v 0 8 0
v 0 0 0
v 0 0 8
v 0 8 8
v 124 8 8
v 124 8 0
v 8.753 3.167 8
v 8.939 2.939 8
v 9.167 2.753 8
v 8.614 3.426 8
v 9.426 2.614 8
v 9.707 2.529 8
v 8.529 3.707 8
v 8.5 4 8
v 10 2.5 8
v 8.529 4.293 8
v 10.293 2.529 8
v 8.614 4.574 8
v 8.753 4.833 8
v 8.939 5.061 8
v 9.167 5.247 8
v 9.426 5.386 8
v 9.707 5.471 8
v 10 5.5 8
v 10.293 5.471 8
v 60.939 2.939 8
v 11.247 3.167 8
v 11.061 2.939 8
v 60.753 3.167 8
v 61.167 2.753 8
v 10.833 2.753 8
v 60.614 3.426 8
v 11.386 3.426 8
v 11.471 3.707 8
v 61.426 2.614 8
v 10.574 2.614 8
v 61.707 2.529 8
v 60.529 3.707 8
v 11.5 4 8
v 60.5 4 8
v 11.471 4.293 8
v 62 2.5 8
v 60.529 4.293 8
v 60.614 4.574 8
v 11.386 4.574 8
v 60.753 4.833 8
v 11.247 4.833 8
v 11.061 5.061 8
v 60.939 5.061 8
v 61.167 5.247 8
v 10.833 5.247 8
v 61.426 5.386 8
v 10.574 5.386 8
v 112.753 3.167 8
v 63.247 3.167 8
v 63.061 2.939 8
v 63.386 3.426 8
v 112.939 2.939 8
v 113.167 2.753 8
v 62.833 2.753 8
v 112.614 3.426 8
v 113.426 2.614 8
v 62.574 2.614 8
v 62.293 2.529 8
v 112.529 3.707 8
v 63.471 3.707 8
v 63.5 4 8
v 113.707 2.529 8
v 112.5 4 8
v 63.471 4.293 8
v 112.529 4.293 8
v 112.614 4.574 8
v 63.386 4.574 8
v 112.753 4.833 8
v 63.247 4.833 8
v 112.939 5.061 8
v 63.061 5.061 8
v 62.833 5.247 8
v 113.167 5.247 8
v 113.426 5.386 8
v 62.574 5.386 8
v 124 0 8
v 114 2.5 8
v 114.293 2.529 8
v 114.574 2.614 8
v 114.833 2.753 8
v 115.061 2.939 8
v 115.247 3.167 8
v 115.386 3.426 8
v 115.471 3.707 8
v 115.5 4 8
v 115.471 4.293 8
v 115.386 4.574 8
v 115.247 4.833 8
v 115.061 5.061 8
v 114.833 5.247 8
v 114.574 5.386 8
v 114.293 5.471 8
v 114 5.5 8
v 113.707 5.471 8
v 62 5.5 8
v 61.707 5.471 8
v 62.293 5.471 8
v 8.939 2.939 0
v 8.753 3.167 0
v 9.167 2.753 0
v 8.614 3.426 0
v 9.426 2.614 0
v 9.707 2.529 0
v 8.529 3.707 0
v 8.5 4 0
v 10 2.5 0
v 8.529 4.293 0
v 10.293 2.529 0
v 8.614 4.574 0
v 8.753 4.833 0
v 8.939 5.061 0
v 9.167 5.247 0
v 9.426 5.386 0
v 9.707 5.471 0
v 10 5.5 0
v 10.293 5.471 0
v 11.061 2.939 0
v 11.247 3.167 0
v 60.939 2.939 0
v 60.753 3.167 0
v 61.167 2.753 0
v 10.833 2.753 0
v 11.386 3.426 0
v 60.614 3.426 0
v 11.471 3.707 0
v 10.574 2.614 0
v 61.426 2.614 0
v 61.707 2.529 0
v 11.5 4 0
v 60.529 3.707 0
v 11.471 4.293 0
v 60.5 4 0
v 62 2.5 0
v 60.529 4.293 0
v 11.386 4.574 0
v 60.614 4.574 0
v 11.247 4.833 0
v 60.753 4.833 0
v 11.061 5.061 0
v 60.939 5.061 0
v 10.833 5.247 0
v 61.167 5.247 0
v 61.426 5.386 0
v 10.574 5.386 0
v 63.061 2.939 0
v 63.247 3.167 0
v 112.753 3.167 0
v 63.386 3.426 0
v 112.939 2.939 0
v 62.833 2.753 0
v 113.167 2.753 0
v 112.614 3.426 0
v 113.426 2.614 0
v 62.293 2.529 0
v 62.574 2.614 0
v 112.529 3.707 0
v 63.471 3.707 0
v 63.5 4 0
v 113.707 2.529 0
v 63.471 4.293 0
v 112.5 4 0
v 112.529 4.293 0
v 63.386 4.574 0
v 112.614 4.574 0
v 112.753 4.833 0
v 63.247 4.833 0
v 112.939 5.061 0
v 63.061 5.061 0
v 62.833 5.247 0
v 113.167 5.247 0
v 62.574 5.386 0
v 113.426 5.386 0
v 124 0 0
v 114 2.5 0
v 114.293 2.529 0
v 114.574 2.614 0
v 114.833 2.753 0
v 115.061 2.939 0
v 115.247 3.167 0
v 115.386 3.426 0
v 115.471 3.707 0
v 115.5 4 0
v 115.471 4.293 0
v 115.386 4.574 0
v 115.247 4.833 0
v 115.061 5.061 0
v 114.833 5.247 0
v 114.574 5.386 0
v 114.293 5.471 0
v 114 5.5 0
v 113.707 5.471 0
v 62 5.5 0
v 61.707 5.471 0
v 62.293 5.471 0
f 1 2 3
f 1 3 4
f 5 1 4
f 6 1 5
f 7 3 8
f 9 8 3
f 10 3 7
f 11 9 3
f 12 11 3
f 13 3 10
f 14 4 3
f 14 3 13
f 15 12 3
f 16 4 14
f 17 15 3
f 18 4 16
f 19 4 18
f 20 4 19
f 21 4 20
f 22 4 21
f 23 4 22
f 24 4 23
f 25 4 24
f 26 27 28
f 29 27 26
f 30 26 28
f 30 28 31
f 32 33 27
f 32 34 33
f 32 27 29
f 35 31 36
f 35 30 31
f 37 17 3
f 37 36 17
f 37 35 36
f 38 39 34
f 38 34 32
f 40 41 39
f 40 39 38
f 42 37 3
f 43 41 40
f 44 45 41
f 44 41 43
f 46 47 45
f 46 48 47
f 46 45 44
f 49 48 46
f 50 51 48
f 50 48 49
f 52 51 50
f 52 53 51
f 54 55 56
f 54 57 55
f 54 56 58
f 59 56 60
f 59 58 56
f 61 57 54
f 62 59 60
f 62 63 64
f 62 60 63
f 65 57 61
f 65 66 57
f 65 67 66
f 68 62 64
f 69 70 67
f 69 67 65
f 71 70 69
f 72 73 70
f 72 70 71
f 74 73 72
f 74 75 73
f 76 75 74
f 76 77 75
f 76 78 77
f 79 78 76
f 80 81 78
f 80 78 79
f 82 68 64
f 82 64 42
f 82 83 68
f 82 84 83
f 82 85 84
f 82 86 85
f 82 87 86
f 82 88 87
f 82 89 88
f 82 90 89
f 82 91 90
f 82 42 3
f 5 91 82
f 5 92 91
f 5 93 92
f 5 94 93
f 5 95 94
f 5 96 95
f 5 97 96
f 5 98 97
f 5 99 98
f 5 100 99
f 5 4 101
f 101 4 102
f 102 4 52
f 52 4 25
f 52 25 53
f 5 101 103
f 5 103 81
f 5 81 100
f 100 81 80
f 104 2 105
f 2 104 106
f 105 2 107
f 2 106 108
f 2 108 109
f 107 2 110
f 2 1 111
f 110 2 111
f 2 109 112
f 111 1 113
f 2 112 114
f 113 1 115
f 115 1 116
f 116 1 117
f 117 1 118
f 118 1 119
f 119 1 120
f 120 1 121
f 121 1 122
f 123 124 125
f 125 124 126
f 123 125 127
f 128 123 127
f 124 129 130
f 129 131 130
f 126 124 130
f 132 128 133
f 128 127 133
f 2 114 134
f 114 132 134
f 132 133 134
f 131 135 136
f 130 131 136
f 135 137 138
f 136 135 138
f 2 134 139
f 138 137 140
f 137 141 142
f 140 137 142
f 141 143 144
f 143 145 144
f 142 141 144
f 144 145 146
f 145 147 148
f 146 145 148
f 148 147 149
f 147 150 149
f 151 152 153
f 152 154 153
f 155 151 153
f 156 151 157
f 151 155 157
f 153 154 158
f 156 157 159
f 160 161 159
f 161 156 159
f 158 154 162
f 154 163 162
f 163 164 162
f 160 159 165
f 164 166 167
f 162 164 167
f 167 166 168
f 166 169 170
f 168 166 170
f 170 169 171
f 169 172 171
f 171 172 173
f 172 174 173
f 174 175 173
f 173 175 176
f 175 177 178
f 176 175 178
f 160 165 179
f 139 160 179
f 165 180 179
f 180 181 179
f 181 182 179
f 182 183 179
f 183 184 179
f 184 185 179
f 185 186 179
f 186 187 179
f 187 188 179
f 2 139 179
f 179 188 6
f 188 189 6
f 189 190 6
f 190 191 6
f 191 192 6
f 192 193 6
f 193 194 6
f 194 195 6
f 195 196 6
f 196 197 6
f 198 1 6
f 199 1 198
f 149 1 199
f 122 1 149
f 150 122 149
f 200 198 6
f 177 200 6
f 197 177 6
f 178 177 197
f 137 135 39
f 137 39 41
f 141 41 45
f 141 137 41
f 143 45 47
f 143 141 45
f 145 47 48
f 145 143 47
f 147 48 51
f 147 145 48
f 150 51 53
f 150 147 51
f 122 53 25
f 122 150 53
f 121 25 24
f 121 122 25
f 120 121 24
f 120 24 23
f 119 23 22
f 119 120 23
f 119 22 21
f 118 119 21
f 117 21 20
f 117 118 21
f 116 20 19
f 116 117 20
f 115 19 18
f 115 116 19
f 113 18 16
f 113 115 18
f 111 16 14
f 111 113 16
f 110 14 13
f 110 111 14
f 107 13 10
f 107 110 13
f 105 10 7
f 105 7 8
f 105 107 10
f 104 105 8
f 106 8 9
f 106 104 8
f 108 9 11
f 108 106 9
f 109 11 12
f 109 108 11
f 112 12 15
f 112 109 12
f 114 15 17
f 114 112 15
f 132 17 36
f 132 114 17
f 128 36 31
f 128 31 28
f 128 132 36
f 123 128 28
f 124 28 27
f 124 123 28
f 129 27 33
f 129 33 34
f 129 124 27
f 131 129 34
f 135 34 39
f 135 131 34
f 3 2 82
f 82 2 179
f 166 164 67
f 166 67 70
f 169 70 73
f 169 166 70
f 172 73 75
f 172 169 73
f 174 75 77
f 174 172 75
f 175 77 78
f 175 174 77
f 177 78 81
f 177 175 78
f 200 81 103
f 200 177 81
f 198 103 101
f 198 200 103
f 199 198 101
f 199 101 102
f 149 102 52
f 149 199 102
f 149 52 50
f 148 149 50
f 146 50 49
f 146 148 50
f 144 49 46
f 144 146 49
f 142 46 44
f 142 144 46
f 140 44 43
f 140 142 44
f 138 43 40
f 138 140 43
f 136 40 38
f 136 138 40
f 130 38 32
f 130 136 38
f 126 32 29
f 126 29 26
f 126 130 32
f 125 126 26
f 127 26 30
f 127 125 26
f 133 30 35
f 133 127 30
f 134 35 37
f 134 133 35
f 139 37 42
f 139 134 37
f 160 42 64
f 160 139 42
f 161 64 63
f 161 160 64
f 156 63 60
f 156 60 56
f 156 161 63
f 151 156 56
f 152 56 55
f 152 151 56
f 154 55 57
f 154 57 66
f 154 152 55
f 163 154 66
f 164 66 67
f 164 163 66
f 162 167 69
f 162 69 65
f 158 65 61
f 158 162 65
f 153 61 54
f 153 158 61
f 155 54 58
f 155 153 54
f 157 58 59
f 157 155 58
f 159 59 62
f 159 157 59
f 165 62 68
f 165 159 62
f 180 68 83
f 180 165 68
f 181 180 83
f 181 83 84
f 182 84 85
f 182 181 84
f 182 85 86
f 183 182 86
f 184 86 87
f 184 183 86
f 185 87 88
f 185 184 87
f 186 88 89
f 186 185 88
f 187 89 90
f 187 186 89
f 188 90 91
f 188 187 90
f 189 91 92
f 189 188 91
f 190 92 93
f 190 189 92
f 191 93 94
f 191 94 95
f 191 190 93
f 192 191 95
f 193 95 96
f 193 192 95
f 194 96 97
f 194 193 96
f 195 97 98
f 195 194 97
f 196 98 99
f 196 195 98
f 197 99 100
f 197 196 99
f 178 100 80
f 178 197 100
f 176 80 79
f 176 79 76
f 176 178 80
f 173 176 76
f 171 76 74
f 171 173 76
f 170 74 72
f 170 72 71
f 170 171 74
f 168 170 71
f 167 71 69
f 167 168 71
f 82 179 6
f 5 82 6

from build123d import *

# Parameters (mm, degrees)
SKETCH_1_W      = 124
SKETCH_1_H      = 8
SKETCH_1_R      = 1.5
EXTRUDE_1_DEPTH = 8


with BuildPart() as part:
    # 草图1 → 凸台-拉伸1 (new body)
    with BuildSketch(Plane.XY):
        with Locations((62, 4)):
            Rectangle(SKETCH_1_W, SKETCH_1_H)
        with Locations((62, 4)):
            Circle(SKETCH_1_R, mode=Mode.SUBTRACT)
        with Locations((10, 4)):
            Circle(SKETCH_1_R, mode=Mode.SUBTRACT)
        with Locations(Location((114, 4, 0), (0, 0, 180))):
            Circle(SKETCH_1_R, mode=Mode.SUBTRACT)
    extrude(amount=EXTRUDE_1_DEPTH)


solid = part.part
